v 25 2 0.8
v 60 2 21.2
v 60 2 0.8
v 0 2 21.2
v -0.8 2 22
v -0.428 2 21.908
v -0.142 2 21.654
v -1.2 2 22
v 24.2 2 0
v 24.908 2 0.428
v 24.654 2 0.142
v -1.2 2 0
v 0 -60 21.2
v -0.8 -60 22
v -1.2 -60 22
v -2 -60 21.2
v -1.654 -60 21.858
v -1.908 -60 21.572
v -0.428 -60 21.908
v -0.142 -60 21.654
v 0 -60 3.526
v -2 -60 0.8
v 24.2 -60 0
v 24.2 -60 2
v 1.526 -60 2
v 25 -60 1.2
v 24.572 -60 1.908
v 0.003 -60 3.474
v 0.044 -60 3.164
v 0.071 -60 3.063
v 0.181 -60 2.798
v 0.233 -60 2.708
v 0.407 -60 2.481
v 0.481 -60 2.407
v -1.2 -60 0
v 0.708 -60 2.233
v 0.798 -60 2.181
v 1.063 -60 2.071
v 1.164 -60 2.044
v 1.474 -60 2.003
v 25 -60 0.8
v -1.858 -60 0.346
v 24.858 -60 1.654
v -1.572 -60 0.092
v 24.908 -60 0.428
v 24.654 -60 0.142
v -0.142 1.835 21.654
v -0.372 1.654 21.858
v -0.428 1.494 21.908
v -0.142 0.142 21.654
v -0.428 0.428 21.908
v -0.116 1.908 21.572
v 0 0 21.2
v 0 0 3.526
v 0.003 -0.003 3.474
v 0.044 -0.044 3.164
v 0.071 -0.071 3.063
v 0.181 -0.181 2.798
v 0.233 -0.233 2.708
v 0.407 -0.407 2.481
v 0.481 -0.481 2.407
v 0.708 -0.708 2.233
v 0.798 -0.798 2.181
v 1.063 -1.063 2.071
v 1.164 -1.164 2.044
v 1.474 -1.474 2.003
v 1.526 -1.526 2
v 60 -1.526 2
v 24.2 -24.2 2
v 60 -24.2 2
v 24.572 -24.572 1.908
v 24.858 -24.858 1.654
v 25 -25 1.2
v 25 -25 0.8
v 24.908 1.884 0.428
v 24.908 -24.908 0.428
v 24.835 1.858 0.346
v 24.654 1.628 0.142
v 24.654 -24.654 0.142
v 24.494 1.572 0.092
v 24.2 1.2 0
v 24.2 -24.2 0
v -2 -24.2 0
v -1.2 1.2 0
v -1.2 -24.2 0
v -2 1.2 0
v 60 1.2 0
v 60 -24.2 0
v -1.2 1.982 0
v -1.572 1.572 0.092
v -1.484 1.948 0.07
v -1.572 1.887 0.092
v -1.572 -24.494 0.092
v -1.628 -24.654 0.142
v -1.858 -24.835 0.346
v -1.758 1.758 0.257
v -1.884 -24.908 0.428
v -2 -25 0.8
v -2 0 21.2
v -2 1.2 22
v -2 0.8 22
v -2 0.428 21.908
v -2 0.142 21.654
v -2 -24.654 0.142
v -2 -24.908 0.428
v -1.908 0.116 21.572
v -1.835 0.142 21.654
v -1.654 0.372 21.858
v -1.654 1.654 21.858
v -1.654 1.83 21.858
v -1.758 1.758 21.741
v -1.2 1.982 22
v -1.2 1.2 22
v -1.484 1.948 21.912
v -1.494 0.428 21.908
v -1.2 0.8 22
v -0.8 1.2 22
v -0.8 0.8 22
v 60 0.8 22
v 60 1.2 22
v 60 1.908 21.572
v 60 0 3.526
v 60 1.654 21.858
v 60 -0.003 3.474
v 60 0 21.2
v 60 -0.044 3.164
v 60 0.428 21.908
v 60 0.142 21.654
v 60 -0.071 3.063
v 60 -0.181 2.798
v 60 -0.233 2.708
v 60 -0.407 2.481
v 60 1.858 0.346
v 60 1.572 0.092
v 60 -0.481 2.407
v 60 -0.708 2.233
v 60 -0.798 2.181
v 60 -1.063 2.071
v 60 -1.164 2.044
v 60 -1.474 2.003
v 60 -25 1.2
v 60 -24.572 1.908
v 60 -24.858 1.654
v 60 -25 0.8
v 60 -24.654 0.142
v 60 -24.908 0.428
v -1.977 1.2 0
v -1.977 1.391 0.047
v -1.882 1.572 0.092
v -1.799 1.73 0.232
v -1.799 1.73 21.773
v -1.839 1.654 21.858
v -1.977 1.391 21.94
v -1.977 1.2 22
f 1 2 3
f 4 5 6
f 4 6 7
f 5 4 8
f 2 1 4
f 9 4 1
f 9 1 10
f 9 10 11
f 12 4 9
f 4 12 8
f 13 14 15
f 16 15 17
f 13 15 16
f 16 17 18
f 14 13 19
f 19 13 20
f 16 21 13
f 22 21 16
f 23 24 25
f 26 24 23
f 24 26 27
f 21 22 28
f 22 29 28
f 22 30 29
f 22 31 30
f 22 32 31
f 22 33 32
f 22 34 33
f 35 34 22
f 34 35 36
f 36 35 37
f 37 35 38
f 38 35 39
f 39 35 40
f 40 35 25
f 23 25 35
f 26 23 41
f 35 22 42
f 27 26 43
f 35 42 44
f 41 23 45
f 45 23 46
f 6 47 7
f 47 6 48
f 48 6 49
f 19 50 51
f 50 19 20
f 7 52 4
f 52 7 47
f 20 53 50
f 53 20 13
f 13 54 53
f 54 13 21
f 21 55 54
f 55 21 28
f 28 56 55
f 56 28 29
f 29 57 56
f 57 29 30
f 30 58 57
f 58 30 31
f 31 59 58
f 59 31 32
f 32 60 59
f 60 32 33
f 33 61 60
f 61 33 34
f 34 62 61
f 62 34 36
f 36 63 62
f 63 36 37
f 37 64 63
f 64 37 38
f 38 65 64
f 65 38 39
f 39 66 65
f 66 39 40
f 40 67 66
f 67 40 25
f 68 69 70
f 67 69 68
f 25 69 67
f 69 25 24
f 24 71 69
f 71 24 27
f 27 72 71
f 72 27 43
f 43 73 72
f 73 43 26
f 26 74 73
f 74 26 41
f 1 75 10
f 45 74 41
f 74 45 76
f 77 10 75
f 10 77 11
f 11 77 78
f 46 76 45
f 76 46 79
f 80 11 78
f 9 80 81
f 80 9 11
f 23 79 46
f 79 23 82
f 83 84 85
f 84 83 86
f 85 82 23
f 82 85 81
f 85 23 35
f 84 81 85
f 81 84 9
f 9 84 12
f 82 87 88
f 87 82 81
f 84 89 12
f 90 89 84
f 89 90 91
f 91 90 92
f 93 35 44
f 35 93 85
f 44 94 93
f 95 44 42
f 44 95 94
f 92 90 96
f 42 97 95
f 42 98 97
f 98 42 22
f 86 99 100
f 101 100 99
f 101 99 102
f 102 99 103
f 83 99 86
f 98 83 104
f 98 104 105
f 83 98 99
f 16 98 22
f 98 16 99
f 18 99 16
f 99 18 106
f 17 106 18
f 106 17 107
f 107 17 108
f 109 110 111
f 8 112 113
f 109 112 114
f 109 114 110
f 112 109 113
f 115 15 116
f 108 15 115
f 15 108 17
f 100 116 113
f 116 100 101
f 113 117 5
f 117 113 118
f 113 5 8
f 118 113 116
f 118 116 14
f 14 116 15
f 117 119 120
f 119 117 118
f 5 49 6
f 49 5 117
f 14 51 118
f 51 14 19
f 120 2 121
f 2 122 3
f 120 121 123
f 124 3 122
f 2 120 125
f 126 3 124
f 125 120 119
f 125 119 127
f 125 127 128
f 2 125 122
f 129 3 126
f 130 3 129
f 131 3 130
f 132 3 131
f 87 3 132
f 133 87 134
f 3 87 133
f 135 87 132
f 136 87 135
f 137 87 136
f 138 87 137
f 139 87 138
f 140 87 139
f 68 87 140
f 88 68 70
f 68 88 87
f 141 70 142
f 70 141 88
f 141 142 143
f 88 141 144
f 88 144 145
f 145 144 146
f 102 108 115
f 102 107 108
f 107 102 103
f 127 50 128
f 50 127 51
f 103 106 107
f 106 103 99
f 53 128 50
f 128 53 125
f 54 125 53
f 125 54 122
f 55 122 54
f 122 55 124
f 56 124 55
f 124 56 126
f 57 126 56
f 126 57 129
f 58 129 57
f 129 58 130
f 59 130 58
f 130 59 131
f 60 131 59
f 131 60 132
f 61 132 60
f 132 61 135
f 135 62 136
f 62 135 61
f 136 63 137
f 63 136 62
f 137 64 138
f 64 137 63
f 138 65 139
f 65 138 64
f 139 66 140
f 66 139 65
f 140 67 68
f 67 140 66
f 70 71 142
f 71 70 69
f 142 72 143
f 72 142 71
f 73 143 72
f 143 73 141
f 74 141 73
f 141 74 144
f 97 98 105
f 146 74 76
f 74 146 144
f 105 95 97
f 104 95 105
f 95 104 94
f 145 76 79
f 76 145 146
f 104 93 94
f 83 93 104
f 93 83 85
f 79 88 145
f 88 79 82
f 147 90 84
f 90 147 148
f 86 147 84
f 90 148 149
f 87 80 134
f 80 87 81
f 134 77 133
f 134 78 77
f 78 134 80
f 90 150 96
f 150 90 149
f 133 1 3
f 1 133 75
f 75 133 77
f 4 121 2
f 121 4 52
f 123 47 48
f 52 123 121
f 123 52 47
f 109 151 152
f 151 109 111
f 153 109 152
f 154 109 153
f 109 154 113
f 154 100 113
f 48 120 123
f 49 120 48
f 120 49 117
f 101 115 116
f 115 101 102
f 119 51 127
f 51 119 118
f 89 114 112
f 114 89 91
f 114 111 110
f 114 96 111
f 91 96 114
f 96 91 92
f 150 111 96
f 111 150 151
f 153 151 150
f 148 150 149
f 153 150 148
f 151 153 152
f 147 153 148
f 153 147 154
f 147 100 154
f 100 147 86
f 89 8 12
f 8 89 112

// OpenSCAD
// ============================================================
// Corner Edge Trim  (L-in-plan angle "nosing")
// An aluminium-stair-lip-style angle trim that slips over an
// exposed 90-degree edge (a top flange lying on the surface plus
// a face flange covering the vertical face), but which WRAPS AN
// OUTSIDE CORNER — an "L" when viewed from above. Edge protection
// / cover: the two arms turn the corner and shield both edges.
//
// Coordinate system (as installed):
//   X = run of one arm  (along one top edge)
//   Y = run of the other arm (along the adjacent top edge)
//   Z = height          (Z = 0 is the protected top surface;
//                        the face flanges hang down into -Z)
//
// The protected slab notionally fills the +X, +Y quadrant with its
// top at Z = 0; the outside corner is the Z axis at X = 0, Y = 0.
// The face flanges sit proud of the two vertical faces (X = 0 and
// Y = 0) on their outer, -X / -Y sides.
//
// Cross-section is an L (angle): a top flange (Z in [0, t]) that
// covers the surface, meeting a face flange (proud by t) that
// covers the vertical face. The concave inner corner is filleted.
//
// All exposed OUTER edges are eased so a bare toe can't catch on
// them (top nose, bottom lip, the flange's top-inner floor edge and
// the outside vertical corner). The two arm ENDS are left square so
// they butt flush against a wall.
//
// Standalone — no external dependencies.
// All units: millimeters.
// ============================================================

/* [Trim Geometry] */
arm_length_x     = 60;   // Run of the X arm from the corner (X)
arm_length_y     = 60;   // Run of the Y arm from the corner (Y)
top_flange_width = 25;   // How far the top flange covers the surface
drop_height      = 20;   // How far the face flange drops down the face
thickness        = 2;    // Wall thickness (t)
inner_fillet     = 1.5;  // Radius at the concave inner corner (0 = sharp)
edge_round       = 0.8;  // Rounding on the exposed outer edges (toe safety)

/* [View] */
export_mode      = "print"; // print | assembly

/* [Quality] */
$fa = 1;   // Minimum facet angle
$fs = 0.4; // Minimum facet edge length (mm), matched to a 0.4 mm nozzle

// ============================================================
// DERIVED
// ============================================================

// Each arm's extrude starts thickness past the corner (into the
// far arm's territory) so the outer corner post is fully filled
// when the two arms are unioned.
corner_overlap = thickness;

// Toe-safety rounding. The longitudinal (along-arm) edges are eased
// in the 2-D cross-section, clamped so a full round never eats
// through a flange. The outside vertical corner is eased in plan,
// clamped to stay inside the solid corner post.
edge_r   = min(edge_round, thickness / 2 - 0.05);
corner_r = min(edge_round, thickness - 0.05);

// ============================================================
// GEOMETRY
// ============================================================

// L cross-section, drawn in a local 2-D plane:
//   local X = across the top flange   (maps to world X for the Y arm)
//   local Y = vertical                (maps to world Z)
// The protected slab sits at local X >= 0; the face flange hangs
// on the outer side at local X in [-thickness, 0]. A morphological
// close (dilate then erode) rounds the concave inner corner into a
// fillet; a following open (erode then dilate) eases every convex
// outer edge by edge_r for toe safety. Both leave the straight flat
// faces in place, so the fit over the edge is unchanged.
module angle_profile_2d() {
    offset(r = edge_r) offset(r = -edge_r)              // open  -> round outer edges
    offset(r = -inner_fillet) offset(r = inner_fillet)  // close -> fillet inner corner
        polygon(points = [
            [-thickness,       -drop_height],  // outer-bottom of face flange
            [0,                -drop_height],  // inner-bottom of face flange
            [0,                 0],            // inner concave corner
            [top_flange_width,  0],            // inner end of top flange
            [top_flange_width,  thickness],    // outer end of top flange
            [-thickness,        thickness]     // outer-top, closes the loop
        ]);
}

// One arm, running along +Y, its face flange proud on the -X side.
// Extruded from Y = -corner_overlap through Y = arm_length_y.
module y_arm() {
    mirror([0, 1, 0])
        translate([0, corner_overlap, 0])
            rotate([90, 0, 0])
                linear_extrude(height = arm_length_y + corner_overlap, convexity = 10)
                    angle_profile_2d();
}

// The X arm is the Y arm reflected across the diagonal plane y = x
// (the corner's own symmetry plane): runs along +X, face flange on
// the -Y side.
module x_arm() {
    mirror([1, -1, 0]) y_arm();
}

// Vertical sliver removed at the outside corner (X = -t, Y = -t) to
// round that exposed vertical edge. Kept within the solid corner
// post (corner_r <= thickness) so it never bites into open space.
module outer_corner_sliver() {
    translate([-thickness, -thickness, -drop_height - 1])
        linear_extrude(height = drop_height + thickness + 2)
            difference() {
                square([corner_r, corner_r]);
                translate([corner_r, corner_r]) circle(r = corner_r);
            }
}

// Full corner trim: the two arms unioned (overlapping in the corner
// square to fill the outer corner post and keep the top plate and
// both face flanges continuous around the turn), with the outside
// vertical corner eased.
module corner_trim() {
    difference() {
        union() {
            y_arm();
            x_arm();
        }
        outer_corner_sliver();
    }
}

// ============================================================
// VIEWS
// ============================================================

// As-installed: top flanges up (Z in [0, t]), face flanges hanging
// down the two vertical faces.
module assembly_view() {
    color([0.72, 0.72, 0.74])
        corner_trim();
}

// Support-free print orientation: flipped upside-down so the broad
// L-shaped top flange lies flat on the bed and the two face flanges
// stand up as vertical walls (0-degree overhang, no supports).
module print_view() {
    color([0.72, 0.72, 0.74])
        translate([0, 0, thickness])
            rotate([180, 0, 0])
                corner_trim();
}

// ============================================================
// EXPORT
// ============================================================

if (export_mode == "print")
    print_view();
else
    assembly_view();
